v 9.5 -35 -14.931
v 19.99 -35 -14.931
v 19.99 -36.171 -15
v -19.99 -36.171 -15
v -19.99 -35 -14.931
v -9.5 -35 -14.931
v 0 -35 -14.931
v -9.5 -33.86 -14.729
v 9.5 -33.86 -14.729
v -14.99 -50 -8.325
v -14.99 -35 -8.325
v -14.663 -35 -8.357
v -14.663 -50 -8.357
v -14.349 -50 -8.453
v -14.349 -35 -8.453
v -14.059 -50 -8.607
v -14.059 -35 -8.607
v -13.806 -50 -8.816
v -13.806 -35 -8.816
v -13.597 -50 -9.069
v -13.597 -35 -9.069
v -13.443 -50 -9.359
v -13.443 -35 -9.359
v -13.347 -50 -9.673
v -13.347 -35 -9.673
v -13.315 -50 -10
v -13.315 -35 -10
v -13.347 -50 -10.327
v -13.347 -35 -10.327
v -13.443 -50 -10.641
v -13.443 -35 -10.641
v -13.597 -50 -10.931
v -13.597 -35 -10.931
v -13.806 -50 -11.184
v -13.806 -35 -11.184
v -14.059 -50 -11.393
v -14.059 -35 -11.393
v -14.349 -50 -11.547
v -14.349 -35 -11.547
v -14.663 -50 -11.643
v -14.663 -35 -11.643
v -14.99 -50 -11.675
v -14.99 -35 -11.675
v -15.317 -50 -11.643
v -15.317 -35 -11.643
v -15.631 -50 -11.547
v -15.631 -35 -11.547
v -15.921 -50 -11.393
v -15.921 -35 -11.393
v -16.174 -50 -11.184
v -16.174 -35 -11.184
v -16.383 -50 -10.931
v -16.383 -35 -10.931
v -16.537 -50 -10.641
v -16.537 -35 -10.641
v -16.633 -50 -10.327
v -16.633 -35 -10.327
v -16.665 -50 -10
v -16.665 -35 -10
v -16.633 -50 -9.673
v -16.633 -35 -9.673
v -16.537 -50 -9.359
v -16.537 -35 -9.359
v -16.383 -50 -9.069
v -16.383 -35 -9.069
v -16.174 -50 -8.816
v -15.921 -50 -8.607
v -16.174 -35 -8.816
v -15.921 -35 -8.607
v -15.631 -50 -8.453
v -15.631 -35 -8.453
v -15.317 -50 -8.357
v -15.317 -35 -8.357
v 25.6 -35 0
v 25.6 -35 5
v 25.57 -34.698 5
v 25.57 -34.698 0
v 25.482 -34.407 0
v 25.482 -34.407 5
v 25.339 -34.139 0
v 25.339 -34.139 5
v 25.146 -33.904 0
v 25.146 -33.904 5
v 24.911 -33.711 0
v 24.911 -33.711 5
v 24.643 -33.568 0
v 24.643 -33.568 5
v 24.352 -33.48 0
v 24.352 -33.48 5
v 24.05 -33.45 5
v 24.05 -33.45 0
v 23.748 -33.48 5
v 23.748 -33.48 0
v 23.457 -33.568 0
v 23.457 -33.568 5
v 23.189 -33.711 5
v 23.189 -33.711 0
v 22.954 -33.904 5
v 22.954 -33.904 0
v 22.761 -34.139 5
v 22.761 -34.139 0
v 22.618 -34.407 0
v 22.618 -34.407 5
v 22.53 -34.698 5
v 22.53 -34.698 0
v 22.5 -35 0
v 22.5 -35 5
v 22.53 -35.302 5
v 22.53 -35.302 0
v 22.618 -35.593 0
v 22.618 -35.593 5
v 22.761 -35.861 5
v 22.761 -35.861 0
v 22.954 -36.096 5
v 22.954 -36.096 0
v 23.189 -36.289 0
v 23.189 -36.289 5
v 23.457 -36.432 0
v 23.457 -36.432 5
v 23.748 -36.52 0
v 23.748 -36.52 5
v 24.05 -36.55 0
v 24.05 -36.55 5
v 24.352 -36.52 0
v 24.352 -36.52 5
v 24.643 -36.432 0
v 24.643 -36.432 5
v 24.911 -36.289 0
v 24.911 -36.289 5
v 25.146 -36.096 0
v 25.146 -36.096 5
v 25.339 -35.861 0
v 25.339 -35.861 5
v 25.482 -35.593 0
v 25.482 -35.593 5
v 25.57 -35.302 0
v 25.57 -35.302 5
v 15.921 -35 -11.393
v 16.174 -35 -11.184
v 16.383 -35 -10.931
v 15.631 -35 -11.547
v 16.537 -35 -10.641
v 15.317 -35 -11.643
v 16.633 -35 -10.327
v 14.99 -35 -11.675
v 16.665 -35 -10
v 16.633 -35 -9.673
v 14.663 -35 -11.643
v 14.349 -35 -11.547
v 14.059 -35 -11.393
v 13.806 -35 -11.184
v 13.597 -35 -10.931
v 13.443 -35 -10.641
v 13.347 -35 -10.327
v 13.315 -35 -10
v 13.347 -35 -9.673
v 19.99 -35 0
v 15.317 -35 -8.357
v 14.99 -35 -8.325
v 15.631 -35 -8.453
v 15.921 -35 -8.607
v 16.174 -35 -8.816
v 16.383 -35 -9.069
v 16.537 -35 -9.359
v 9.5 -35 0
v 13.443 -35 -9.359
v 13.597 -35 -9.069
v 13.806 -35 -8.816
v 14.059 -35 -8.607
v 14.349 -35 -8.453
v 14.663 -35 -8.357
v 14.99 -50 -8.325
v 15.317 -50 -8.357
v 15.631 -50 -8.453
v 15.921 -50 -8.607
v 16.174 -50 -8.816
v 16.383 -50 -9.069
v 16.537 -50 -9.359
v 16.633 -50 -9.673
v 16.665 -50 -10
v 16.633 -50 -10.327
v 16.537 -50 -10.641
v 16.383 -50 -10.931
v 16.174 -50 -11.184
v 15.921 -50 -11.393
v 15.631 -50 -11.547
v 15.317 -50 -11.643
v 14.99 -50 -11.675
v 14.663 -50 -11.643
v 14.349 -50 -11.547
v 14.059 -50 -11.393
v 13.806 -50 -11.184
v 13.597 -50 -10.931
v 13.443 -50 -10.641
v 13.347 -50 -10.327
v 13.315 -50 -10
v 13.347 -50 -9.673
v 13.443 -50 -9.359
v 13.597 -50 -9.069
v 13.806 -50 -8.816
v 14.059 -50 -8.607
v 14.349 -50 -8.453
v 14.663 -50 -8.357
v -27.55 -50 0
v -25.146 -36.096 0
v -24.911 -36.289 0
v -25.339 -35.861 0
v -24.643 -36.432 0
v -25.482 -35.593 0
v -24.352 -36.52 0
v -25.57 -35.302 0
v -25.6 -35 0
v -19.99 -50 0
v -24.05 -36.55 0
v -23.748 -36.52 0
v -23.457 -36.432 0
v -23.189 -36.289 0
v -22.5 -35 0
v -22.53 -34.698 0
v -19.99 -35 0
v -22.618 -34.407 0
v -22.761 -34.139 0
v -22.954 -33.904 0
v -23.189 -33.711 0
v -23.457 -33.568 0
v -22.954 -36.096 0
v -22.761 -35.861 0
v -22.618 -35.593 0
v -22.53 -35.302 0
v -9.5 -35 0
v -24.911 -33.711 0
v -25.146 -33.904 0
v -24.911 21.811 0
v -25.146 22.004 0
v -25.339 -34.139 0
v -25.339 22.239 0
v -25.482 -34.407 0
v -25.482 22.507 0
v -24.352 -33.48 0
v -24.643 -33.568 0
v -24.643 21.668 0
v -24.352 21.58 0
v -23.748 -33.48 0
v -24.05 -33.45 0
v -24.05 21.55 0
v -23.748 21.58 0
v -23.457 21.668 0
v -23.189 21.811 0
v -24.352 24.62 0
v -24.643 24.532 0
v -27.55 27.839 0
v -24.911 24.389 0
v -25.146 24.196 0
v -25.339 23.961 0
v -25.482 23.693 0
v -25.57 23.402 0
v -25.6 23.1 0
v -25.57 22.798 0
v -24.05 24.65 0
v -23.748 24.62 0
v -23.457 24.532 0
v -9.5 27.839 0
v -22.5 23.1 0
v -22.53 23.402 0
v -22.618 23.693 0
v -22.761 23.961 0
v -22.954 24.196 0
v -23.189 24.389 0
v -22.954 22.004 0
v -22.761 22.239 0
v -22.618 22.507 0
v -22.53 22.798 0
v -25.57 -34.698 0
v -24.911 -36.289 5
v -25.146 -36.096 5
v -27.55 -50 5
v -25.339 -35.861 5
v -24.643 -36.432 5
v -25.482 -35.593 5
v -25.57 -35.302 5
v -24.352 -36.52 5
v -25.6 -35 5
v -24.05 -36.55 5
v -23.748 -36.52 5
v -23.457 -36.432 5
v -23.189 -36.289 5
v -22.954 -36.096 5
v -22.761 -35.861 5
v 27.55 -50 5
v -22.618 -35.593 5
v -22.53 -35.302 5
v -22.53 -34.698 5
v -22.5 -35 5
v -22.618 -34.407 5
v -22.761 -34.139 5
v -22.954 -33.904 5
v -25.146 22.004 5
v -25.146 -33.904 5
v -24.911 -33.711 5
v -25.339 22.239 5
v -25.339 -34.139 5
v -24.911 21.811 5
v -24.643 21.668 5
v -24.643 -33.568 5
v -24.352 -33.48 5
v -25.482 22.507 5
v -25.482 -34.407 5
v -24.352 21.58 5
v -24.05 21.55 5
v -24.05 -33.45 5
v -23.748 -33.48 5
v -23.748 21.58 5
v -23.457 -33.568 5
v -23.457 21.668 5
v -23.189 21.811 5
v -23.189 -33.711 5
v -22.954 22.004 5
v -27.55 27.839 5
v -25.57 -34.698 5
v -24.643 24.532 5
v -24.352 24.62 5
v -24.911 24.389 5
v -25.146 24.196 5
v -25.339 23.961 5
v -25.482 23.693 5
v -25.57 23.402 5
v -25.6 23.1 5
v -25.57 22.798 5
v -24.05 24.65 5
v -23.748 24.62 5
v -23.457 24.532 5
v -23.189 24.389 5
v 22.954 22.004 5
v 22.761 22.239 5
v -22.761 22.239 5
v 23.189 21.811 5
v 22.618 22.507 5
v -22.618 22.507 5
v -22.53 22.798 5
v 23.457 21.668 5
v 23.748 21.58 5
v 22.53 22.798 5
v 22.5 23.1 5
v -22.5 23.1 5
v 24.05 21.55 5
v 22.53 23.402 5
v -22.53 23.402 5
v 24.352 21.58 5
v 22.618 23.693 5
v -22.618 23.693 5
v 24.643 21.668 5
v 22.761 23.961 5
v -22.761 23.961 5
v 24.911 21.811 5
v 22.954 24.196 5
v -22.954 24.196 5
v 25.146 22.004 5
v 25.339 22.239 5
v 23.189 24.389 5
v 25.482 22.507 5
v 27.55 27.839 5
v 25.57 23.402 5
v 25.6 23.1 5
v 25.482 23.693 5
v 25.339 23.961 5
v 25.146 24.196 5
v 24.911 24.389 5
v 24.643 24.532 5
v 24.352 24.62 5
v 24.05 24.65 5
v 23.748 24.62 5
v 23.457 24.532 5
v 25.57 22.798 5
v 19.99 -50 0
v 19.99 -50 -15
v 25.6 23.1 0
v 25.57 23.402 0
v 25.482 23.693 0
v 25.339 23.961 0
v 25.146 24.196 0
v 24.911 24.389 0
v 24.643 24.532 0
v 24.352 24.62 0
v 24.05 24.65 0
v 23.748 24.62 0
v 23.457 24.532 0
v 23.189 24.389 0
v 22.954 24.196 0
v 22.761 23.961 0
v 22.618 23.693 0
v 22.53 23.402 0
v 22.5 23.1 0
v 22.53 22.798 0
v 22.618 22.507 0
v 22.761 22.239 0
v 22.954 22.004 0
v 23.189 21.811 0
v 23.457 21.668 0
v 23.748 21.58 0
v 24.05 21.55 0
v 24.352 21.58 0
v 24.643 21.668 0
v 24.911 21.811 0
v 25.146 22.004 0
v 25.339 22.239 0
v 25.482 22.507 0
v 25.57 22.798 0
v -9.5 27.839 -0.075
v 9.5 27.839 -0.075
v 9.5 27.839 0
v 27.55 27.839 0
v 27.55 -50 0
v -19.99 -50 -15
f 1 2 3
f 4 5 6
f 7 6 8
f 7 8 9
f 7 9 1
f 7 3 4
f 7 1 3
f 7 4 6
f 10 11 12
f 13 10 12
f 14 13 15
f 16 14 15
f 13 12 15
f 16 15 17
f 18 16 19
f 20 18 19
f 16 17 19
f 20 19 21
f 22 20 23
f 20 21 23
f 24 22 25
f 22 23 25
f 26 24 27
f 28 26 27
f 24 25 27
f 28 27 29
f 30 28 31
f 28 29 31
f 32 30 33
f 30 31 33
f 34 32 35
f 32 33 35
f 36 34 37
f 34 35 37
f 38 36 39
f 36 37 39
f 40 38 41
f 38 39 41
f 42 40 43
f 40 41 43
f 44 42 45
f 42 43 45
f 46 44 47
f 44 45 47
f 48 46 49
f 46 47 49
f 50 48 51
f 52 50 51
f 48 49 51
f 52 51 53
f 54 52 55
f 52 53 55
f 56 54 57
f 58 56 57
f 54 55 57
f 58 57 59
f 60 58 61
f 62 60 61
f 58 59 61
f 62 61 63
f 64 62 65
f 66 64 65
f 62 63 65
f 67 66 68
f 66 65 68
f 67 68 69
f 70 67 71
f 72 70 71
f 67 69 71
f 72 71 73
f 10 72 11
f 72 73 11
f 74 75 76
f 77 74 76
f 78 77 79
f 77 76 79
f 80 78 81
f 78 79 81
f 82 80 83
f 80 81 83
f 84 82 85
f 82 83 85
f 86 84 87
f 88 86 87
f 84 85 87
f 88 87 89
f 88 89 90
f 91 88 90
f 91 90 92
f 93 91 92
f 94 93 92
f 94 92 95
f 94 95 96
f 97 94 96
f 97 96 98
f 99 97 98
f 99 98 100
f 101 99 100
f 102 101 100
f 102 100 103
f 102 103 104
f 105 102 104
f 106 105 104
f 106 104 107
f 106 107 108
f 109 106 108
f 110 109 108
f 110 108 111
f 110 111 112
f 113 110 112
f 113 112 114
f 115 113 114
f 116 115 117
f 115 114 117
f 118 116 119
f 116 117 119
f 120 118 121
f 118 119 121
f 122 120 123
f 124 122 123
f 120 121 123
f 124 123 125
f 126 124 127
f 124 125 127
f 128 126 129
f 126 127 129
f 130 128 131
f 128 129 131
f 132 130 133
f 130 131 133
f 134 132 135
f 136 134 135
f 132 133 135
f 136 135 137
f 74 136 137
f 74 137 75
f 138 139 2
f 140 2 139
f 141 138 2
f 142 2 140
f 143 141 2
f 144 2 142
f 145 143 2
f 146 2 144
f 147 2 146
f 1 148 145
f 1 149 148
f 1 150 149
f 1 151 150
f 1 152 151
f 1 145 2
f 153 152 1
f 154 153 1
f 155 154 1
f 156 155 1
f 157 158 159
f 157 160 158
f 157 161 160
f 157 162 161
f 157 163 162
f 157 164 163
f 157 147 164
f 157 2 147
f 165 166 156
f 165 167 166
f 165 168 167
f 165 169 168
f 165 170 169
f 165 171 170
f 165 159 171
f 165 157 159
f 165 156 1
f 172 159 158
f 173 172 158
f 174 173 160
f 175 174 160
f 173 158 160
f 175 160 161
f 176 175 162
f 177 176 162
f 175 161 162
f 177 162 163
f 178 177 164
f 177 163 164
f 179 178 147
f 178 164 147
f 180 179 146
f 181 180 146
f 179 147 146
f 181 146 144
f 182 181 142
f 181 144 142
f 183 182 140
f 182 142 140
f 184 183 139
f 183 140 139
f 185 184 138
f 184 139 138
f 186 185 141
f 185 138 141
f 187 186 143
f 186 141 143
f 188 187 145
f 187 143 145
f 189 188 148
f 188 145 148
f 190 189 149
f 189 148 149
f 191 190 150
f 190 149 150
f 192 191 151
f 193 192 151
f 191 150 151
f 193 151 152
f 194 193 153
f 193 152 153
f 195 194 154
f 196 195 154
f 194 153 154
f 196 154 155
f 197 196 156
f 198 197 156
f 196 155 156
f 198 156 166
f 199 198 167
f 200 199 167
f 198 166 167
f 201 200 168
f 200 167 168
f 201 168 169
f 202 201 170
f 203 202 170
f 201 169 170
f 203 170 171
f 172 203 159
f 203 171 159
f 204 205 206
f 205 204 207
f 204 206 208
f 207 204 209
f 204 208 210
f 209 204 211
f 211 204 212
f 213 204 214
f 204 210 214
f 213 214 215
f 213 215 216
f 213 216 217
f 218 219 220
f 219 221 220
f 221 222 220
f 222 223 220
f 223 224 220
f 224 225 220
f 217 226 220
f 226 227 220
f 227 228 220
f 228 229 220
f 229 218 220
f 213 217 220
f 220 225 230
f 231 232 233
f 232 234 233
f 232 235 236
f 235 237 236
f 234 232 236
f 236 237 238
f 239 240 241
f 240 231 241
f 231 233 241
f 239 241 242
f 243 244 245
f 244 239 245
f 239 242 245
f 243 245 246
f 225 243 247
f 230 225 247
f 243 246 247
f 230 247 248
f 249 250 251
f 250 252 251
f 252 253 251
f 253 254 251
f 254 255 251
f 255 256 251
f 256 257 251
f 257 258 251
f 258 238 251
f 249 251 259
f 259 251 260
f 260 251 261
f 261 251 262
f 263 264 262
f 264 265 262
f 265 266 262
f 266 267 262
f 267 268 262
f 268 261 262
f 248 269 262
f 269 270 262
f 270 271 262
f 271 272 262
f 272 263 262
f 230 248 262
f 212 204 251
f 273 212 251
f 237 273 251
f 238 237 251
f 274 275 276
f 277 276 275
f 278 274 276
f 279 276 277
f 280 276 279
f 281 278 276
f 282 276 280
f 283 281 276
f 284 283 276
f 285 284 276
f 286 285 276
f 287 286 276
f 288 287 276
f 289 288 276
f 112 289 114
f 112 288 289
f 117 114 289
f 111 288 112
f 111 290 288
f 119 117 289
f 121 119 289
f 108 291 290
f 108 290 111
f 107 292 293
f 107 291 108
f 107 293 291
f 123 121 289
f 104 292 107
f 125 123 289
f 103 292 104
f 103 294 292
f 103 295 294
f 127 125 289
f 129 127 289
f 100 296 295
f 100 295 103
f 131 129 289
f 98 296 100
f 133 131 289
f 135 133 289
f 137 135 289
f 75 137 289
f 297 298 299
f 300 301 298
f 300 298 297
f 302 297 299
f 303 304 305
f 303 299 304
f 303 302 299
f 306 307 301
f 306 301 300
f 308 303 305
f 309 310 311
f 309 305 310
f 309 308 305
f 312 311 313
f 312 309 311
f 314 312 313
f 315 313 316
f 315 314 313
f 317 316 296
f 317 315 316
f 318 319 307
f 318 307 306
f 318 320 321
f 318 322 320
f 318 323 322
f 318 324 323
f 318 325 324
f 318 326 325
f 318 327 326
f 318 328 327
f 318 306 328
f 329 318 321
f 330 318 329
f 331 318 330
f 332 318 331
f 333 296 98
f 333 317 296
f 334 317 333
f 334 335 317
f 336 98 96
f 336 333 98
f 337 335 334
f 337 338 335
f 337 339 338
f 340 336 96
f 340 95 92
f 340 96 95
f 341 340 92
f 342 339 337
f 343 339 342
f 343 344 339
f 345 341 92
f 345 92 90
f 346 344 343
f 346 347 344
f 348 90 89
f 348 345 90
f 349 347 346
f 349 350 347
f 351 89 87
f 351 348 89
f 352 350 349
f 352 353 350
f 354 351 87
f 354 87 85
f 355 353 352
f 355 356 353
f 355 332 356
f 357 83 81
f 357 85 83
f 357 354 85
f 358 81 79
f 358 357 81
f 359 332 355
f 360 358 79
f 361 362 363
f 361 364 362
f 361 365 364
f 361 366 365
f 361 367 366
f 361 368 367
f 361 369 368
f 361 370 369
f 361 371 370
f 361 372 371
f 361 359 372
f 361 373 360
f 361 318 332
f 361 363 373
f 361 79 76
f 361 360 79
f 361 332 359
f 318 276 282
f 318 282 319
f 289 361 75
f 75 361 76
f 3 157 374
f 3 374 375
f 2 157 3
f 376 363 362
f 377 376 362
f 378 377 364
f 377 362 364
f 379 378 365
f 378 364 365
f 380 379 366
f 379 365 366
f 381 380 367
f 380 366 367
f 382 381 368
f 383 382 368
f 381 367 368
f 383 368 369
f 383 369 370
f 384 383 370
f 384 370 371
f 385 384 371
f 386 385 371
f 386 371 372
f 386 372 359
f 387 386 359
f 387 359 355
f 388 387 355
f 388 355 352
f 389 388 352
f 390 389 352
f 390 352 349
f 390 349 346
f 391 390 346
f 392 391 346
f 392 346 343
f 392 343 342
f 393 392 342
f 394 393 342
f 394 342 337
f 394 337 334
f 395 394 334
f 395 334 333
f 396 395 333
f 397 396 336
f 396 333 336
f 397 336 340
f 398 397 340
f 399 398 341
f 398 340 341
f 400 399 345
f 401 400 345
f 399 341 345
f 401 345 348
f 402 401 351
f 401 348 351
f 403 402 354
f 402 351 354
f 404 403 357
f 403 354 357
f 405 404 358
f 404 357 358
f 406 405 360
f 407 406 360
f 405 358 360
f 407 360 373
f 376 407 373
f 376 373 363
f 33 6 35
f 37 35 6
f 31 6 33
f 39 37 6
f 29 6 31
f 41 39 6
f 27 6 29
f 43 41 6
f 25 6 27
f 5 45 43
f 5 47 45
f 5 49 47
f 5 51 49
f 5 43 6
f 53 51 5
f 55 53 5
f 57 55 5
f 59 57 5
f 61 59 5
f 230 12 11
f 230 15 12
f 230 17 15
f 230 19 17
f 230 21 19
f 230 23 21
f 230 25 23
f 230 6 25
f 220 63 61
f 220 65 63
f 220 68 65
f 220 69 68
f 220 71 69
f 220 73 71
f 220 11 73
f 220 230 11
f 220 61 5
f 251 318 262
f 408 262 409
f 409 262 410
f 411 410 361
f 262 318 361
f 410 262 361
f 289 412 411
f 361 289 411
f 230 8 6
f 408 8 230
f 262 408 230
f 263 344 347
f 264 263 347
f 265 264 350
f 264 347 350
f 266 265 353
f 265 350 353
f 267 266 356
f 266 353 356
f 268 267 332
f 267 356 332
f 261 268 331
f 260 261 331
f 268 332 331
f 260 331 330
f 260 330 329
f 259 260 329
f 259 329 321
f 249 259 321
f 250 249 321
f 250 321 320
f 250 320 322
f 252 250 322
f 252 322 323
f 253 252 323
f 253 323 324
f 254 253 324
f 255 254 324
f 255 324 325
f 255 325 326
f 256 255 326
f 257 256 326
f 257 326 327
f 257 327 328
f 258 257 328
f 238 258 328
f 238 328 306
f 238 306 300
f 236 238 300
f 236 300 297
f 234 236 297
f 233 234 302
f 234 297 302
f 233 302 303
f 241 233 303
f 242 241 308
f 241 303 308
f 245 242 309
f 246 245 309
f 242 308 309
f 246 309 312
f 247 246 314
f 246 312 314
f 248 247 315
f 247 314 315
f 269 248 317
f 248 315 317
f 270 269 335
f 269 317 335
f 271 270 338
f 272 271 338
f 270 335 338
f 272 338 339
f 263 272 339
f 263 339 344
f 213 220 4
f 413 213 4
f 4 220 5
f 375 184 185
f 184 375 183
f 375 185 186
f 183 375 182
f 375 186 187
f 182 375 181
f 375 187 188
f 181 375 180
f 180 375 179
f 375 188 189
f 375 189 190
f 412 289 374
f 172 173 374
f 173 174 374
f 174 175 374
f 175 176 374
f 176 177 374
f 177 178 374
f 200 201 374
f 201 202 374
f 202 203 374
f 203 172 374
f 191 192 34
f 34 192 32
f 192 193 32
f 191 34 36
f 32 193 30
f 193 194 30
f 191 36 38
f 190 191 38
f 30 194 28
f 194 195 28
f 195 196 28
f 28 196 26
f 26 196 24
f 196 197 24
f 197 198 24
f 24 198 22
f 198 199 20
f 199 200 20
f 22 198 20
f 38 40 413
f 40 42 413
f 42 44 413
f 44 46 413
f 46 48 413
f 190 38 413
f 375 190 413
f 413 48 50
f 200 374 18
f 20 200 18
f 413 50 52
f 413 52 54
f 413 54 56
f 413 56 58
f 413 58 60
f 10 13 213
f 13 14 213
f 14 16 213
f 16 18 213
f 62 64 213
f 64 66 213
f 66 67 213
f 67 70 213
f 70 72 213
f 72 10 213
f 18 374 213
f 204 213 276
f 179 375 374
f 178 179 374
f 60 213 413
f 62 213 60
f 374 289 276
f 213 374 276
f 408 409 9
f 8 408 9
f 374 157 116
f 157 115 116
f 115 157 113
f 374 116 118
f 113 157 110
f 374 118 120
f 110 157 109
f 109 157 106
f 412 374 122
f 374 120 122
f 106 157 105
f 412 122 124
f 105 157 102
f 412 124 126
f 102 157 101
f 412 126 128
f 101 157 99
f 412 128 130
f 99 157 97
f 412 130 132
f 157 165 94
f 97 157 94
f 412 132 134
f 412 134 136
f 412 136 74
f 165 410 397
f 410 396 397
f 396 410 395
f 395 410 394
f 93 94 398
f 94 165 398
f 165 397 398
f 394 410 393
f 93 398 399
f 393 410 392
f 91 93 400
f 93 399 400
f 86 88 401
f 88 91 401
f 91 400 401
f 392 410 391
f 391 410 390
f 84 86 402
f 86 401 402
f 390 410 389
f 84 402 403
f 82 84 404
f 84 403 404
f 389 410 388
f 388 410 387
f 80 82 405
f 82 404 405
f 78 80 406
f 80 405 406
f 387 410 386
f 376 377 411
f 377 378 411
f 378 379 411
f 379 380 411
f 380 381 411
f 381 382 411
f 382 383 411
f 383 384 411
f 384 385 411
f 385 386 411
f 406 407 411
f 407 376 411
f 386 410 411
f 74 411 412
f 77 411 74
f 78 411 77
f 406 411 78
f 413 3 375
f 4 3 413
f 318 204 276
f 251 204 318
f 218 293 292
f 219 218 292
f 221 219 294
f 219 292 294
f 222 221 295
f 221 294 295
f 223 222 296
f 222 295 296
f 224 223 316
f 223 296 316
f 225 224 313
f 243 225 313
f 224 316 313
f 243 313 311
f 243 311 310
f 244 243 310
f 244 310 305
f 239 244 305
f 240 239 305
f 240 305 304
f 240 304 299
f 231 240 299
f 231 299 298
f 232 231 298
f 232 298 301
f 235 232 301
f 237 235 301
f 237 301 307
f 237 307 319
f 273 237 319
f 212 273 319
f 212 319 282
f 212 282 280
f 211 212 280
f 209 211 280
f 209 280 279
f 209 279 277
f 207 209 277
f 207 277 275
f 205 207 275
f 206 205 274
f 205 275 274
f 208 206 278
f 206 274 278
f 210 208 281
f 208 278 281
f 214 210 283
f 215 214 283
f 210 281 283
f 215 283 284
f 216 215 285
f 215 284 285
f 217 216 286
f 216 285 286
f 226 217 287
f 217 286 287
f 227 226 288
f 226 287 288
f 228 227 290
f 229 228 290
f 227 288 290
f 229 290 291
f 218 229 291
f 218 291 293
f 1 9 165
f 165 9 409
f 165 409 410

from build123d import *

# Parameters (mm, degrees)
SKETCH_1_W          = 65
SKETCH_1_H          = 100
EXTRUDE_1_DEPTH     = 5
SKETCH_3_W          = 65
SKETCH_3_H          = 15
EXTRUDE_2_DEPTH     = 15
SKETCH_4_R          = 1.675
CUT_EXTRUDE_1_DEPTH = 15
SKETCH_8_R          = 1.55
CUT_EXTRUDE_2_DEPTH = 15
EXTRUDE_4_DEPTH     = 19
SKETCH_10_W         = 12.51
SKETCH_10_H         = 20.752848232
SKETCH_10_H_2       = 21.550243719
CUT_EXTRUDE_3_DEPTH = 93.229333728
SKETCH_11_W         = 65
SKETCH_11_H         = 22.160800115
CUT_EXTRUDE_4_DEPTH = 10
FILLET_START        = -21
FILLET_1_DEPTH      = 42
SKETCH_12_W         = 13.248565373
SKETCH_12_H         = 85.777871489
SKETCH_12_W_2       = 8.637190958
SKETCH_12_H_2       = 86.586054809
CUT_EXTRUDE_6_DEPTH = 10


with BuildPart() as part:
    # 草图1 → 凸台-拉伸1 (new body)
    with BuildSketch(Plane.XY):
        Rectangle(SKETCH_1_W, SKETCH_1_H)
    extrude(amount=EXTRUDE_1_DEPTH)

    # 草图3 → 凸台-拉伸2 (add)
    with BuildSketch(Plane(origin=(0, 0, 0), x_dir=(-1, 0, 0), z_dir=(0, 0, -1))):
        with Locations((0, -42.5)):
            Rectangle(SKETCH_3_W, SKETCH_3_H)
    extrude(amount=EXTRUDE_2_DEPTH)

    # 草图4 → 切除-拉伸1 (cut)
    with BuildSketch(Plane(origin=(0, -35, 0), x_dir=(1, 0, 0), z_dir=(0, 1, 0))):
        with Locations(Location((-14.99, 10, 0), (0, 0, 270))):
            Circle(SKETCH_4_R)
        with Locations(Location((14.99, 10, 0), (0, 0, 270))):
            Circle(SKETCH_4_R)
    extrude(amount=-CUT_EXTRUDE_1_DEPTH, mode=Mode.SUBTRACT)

    # 草图8 → 切除-拉伸2 (cut)
    with BuildSketch(Plane.XY.offset(5)):
        with Locations((-24.05, 23.1)):
            Circle(SKETCH_8_R)
        with Locations((24.05, 23.1)):
            Circle(SKETCH_8_R)
        with Locations((-24.05, -35)):
            Circle(SKETCH_8_R)
        with Locations((24.05, -35)):
            Circle(SKETCH_8_R)
    extrude(amount=-CUT_EXTRUDE_2_DEPTH, mode=Mode.SUBTRACT)

    # 草图9 → 凸台-拉伸4 (add)
    with BuildSketch(Plane(origin=(9.5, 0, 0), x_dir=(0, 0, -1), z_dir=(1, 0, 0))):
        Polygon((15, -35), (0, -35), (0, 28.153160969), align=None)
    extrude(amount=-EXTRUDE_4_DEPTH)

    # 草图10 → 切除-拉伸3 (cut, through all)
    with BuildSketch(Plane(origin=(0, -35, 0), x_dir=(1, 0, 0), z_dir=(0, 1, 0))):
        with Locations((26.245, 10.376424116)):
            Rectangle(SKETCH_10_W, SKETCH_10_H)
        with Locations((-26.245, 10.77512186)):
            Rectangle(SKETCH_10_W, SKETCH_10_H_2)
    extrude(amount=-CUT_EXTRUDE_3_DEPTH, mode=Mode.SUBTRACT)

    # 草图11 → 切除-拉伸4 (cut)
    with BuildSketch(Plane.XY.offset(5)):
        with Locations((0, 38.919599942)):
            Rectangle(SKETCH_11_W, SKETCH_11_H)
    extrude(amount=-CUT_EXTRUDE_4_DEPTH, mode=Mode.SUBTRACT)

    # 圆角1: read off the stored shape, not the designer's step
    # 圆角1 outline → 圆角1 (cut)
    with BuildSketch(Plane.YZ.offset(FILLET_START)):
        with BuildLine():
            Line((-36.171296068, -15), (-35, -15))
            Line((-35, -15), (-33.860407805, -14.729326566))
            add(Edge.make_bspline(
                [(-33.860407805, -14.729326566), (-34.0852258, -14.782724842), (-34.31196566, -14.829719593), (-34.540261945, -14.87017776), (-34.769736346, -14.904008746), (-35.233444691, -14.958699176), (-35.467701672, -14.979373092), (-35.702365681, -14.993139997), (-35.937031343, -15), (-36.171296068, -15)],
                knots=[0.503429998, 0.503429998, 0.503429998, 0.503429998, 0.503429998, 0.503429998, 1, 1, 1, 1, 1.503429998, 1.503429998, 1.503429998, 1.503429998, 1.503429998, 1.503429998], degree=5, weights=[1, 1, 0.99999889, 0.999998883, 1, 1, 0.999998819, 0.999998827, 1, 1]))
        make_face()
    extrude(amount=FILLET_1_DEPTH, mode=Mode.SUBTRACT)

    # 草图12 → 切除-拉伸6 (cut)
    with BuildSketch(Plane(origin=(0, 0, 0), x_dir=(-1, 0, 0), z_dir=(0, 0, -1))):
        with Locations((-34.174282686, -10.092547721)):
            Rectangle(SKETCH_12_W, SKETCH_12_H)
        with Locations((31.868595479, -11.75852662)):
            Rectangle(SKETCH_12_W_2, SKETCH_12_H_2)
    extrude(amount=-CUT_EXTRUDE_6_DEPTH, mode=Mode.SUBTRACT)


solid = part.part
